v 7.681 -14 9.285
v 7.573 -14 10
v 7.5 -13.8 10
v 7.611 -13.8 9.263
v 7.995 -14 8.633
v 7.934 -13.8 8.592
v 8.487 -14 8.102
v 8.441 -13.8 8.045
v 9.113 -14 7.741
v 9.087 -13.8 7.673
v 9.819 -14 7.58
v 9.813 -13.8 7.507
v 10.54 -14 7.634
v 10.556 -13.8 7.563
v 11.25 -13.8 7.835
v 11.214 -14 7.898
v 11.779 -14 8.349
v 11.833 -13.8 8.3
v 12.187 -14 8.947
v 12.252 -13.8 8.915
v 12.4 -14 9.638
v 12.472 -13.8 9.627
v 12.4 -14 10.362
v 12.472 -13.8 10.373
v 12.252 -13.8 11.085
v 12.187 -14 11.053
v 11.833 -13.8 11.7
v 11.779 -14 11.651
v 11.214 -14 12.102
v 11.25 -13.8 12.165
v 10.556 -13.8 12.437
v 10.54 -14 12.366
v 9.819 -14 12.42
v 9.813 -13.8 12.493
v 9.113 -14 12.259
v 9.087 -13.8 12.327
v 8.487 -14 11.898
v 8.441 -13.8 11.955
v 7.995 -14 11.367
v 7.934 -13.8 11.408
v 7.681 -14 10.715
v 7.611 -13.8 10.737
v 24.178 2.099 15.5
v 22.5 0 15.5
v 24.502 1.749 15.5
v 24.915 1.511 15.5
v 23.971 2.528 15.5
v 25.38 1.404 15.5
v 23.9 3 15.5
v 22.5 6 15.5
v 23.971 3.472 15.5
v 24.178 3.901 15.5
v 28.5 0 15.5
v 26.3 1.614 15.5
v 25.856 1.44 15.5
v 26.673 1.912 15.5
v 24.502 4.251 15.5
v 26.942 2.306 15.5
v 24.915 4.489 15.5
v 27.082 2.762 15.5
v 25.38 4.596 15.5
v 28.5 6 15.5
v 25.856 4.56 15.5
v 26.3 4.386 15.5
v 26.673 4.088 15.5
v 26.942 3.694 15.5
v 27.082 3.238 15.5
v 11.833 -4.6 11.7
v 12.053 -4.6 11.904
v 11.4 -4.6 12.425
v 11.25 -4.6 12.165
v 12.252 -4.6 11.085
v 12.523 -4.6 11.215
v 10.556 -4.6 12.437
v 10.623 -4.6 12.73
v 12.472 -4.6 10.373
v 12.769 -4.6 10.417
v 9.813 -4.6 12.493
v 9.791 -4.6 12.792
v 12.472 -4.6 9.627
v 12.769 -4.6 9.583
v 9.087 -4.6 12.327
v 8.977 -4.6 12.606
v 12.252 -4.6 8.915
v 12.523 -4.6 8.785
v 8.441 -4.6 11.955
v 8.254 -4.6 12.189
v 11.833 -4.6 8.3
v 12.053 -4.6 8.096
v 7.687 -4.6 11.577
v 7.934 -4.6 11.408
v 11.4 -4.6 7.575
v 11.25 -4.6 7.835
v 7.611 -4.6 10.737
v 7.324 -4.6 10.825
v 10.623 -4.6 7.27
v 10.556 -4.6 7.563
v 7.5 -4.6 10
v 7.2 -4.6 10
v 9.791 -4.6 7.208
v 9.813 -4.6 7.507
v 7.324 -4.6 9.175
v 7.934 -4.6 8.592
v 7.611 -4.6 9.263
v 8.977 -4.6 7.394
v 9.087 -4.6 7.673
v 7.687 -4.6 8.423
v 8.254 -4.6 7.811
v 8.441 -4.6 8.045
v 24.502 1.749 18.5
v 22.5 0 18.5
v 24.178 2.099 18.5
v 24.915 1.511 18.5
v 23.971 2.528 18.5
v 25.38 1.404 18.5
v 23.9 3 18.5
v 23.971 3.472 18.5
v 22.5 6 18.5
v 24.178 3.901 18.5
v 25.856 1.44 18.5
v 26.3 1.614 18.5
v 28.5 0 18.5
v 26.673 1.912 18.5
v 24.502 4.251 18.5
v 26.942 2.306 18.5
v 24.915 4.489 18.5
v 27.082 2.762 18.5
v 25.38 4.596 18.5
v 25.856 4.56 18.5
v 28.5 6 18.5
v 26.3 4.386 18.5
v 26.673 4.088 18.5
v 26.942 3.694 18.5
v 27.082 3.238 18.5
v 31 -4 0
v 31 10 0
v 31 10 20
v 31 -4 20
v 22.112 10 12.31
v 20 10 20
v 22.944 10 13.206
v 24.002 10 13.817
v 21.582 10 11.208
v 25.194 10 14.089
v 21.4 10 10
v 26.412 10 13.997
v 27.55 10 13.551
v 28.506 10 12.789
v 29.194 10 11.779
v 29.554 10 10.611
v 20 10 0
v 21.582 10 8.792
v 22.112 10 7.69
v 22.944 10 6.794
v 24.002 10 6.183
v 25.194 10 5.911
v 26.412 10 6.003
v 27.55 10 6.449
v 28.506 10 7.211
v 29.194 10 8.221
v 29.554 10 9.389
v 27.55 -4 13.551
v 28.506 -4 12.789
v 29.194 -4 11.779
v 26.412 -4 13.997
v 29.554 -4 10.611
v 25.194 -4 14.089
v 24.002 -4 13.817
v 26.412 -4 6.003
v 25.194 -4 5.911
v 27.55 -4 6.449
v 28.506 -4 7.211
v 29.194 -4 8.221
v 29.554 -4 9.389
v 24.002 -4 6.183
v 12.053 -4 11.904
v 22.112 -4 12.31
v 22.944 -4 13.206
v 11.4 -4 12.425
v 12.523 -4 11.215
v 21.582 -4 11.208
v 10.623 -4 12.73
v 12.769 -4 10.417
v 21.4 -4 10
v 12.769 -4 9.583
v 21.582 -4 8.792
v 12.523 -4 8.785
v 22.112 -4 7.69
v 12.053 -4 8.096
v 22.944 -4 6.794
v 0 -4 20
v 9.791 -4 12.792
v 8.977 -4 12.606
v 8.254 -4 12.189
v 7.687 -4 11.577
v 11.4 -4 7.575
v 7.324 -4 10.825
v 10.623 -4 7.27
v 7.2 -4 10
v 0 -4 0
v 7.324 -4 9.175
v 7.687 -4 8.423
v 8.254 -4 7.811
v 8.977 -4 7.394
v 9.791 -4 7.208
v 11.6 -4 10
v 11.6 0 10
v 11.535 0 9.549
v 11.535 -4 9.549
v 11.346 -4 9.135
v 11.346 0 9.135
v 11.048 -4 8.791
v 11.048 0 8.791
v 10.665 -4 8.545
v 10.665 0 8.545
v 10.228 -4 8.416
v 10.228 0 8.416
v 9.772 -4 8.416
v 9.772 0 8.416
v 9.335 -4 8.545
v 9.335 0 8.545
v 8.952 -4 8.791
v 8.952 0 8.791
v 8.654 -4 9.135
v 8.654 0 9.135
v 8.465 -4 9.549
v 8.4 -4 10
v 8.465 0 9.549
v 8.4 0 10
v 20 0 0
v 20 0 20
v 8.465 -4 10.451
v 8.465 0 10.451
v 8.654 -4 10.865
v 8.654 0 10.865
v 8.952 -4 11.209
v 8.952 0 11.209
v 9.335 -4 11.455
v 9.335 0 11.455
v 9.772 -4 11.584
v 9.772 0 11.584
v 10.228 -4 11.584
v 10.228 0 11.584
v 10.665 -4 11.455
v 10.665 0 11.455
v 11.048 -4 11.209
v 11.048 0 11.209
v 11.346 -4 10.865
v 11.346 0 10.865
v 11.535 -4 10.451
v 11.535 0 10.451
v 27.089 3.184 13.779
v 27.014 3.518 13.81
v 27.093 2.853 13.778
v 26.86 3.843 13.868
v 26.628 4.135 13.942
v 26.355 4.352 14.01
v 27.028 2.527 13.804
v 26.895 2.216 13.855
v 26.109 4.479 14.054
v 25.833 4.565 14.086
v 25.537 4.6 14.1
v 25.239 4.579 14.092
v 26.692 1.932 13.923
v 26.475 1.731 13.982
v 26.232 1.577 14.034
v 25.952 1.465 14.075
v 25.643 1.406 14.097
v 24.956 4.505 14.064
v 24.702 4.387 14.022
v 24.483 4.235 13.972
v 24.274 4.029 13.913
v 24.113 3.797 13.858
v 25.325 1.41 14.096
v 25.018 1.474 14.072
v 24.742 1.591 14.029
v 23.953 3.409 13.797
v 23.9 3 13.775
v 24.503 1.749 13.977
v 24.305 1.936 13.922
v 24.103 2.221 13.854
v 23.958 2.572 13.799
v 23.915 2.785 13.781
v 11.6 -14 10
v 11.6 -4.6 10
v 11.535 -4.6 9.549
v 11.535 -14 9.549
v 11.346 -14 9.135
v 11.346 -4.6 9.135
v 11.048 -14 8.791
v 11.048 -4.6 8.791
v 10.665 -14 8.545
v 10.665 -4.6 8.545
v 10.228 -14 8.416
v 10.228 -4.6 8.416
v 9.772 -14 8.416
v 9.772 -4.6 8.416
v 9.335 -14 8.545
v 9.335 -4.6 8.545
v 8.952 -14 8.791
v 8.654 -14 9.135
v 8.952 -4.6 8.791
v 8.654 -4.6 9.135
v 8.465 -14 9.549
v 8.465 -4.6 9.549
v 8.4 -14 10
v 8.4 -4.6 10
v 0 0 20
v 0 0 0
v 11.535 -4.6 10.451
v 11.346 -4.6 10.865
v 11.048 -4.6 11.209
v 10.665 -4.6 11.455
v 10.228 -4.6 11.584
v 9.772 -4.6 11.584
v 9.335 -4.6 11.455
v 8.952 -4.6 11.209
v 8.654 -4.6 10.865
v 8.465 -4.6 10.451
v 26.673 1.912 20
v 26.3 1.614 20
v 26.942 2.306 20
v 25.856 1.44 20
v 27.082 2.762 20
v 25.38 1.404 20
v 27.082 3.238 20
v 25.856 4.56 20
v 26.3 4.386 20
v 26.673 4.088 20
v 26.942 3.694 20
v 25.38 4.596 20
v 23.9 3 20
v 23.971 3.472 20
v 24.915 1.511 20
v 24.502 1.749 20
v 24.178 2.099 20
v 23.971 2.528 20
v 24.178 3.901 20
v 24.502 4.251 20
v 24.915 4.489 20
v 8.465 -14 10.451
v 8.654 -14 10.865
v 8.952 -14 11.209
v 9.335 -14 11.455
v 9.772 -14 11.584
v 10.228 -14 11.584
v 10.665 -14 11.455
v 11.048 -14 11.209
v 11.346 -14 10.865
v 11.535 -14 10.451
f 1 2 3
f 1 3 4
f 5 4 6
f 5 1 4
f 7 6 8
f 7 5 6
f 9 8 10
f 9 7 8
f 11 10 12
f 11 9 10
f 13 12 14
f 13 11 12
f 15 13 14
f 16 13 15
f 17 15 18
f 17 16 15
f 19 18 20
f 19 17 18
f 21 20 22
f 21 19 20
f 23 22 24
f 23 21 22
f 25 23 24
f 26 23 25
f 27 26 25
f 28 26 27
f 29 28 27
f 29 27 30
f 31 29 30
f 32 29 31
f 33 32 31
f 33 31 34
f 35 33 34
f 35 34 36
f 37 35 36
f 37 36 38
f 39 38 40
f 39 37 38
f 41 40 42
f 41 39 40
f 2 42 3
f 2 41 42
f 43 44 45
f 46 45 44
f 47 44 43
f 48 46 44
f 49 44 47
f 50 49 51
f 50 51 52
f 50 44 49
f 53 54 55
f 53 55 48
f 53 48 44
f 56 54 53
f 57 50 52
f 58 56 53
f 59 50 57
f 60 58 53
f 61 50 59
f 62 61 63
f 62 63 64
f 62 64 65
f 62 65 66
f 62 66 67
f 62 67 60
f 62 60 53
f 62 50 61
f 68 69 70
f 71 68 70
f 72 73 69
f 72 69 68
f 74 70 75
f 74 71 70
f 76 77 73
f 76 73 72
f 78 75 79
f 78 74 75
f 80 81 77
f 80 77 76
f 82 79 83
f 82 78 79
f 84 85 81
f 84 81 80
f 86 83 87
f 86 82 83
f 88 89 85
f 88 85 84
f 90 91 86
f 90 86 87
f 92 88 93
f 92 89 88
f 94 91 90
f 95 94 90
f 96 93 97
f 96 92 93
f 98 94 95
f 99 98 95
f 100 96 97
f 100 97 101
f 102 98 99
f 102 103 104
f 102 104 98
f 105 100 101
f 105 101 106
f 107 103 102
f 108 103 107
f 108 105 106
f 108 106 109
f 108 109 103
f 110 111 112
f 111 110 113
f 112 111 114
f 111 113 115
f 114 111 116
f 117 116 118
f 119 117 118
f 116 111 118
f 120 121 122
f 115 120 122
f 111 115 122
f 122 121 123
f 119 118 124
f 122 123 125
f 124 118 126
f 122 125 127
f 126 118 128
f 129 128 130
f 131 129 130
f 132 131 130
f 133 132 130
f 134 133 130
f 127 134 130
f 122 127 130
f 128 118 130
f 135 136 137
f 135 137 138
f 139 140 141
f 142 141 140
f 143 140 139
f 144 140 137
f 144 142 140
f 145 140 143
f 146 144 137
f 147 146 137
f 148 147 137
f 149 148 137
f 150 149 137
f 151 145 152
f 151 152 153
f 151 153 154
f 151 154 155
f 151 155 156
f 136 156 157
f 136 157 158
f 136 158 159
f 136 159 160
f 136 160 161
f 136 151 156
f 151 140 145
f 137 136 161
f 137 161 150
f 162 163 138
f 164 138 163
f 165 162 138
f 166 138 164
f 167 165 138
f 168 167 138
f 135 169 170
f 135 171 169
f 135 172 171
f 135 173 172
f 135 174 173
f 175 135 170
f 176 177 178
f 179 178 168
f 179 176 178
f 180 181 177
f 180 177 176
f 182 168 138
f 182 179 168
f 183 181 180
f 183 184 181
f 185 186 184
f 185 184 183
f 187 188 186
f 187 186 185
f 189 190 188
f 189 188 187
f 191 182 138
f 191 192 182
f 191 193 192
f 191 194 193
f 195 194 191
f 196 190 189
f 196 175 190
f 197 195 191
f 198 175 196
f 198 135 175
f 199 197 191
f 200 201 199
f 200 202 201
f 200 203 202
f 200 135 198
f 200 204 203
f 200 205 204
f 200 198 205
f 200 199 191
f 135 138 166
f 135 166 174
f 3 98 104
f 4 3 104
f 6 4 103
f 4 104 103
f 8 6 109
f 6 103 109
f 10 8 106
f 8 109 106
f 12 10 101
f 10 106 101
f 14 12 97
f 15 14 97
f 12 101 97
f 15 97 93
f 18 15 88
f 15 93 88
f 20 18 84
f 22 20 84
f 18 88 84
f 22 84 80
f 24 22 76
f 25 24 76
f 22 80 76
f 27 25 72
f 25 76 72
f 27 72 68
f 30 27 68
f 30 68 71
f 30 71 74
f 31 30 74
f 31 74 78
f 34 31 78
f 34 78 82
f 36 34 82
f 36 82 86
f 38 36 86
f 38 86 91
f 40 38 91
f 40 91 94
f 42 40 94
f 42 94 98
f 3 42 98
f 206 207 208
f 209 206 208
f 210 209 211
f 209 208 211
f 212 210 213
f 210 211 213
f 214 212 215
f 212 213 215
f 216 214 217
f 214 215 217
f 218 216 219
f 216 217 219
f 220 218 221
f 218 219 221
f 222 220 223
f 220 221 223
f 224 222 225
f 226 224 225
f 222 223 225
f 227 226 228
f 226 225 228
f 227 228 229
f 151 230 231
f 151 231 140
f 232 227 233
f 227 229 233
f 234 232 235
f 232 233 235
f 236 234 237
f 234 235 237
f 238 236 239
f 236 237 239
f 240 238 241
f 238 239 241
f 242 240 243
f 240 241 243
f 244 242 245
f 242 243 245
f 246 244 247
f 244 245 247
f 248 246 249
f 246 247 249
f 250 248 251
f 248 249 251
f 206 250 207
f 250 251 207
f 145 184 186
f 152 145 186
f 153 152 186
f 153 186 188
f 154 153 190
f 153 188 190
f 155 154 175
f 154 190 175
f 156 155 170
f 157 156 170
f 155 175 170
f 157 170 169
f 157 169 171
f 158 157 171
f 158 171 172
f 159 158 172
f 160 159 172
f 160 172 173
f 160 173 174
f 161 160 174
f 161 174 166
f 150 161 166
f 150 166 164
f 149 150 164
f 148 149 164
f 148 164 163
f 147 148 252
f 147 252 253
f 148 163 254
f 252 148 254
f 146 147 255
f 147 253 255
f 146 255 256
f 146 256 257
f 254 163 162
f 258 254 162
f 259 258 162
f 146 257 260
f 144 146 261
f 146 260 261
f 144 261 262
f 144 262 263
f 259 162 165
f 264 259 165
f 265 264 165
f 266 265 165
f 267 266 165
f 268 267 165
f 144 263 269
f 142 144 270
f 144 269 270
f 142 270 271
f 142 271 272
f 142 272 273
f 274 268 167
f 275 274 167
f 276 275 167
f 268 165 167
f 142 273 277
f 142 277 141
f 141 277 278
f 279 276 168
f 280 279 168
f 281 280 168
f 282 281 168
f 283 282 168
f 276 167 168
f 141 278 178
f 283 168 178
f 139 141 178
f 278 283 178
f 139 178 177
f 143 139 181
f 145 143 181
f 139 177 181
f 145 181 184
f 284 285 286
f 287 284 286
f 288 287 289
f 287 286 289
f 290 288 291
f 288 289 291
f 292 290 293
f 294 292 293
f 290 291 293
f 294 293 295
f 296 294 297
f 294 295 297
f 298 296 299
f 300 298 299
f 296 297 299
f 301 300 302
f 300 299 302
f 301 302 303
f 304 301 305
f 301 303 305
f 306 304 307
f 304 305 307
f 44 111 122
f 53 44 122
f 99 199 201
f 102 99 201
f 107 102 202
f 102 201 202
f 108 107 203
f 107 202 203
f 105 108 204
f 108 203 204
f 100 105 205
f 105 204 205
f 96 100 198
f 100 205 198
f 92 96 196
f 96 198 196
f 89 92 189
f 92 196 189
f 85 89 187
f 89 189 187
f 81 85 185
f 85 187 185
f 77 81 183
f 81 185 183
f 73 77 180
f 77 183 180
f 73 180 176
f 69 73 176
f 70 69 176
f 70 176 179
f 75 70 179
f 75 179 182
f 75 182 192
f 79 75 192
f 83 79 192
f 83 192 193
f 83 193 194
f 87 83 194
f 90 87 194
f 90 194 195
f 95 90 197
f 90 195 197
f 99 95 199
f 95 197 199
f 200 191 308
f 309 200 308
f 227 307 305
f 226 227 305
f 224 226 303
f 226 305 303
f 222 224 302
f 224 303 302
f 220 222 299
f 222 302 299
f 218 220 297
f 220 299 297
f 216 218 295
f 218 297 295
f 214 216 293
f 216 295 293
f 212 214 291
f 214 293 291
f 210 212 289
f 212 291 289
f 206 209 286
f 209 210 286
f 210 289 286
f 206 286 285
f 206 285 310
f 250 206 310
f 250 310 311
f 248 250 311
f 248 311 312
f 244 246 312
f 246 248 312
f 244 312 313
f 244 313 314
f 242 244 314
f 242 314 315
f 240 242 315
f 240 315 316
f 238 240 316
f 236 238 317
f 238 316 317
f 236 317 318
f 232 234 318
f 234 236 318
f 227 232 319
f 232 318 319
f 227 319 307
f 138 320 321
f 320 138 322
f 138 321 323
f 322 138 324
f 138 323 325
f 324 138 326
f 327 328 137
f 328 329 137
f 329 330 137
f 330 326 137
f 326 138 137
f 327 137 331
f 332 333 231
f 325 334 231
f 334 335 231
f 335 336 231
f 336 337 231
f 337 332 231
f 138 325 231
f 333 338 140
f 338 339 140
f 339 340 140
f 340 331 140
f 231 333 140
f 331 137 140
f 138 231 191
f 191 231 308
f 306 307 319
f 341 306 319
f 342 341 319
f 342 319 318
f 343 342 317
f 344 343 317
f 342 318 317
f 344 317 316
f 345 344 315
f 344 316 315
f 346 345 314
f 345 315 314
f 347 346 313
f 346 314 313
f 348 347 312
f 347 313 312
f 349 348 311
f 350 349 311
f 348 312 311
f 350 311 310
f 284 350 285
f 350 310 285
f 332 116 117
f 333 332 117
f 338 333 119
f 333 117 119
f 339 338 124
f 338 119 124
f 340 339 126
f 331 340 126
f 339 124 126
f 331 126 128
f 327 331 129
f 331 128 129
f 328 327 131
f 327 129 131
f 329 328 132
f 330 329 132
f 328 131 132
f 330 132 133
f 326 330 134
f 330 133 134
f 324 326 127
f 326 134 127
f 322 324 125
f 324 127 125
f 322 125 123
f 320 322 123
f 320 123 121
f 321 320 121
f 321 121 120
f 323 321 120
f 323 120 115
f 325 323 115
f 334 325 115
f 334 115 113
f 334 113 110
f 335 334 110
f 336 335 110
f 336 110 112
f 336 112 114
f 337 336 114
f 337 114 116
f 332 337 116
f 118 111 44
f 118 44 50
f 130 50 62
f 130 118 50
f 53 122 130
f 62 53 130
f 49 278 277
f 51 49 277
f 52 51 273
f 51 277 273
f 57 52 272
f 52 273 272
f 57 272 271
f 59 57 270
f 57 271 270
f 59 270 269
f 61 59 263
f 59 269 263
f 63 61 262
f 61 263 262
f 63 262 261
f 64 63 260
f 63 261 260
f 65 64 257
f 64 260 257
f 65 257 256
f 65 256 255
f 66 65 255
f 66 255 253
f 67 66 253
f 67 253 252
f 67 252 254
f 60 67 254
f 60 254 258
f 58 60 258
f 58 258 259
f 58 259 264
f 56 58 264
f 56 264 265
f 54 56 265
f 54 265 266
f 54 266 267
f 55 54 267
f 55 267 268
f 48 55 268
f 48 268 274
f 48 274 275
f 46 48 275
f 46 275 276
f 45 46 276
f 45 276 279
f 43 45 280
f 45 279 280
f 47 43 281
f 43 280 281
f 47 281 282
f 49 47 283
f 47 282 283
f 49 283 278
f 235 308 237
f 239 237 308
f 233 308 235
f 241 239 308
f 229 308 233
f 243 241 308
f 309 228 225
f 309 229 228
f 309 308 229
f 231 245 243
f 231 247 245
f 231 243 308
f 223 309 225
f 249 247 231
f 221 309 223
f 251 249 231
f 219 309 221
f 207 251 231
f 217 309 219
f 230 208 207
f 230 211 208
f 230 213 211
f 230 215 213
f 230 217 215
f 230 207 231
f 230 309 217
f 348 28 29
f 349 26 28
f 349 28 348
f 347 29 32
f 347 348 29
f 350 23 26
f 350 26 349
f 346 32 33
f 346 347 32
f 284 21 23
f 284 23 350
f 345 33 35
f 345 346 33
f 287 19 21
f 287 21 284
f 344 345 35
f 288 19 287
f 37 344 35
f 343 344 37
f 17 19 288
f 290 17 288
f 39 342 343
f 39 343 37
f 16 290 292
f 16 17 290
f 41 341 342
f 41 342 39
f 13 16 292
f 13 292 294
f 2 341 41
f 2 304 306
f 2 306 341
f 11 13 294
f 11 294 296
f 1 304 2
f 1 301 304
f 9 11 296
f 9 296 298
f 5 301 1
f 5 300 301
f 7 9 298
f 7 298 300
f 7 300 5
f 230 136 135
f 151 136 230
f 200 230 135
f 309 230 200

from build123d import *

# Parameters (mm, degrees)
EXTRUDE_1_DEPTH     = 20
HOLE_WIZARD_2_D     = 8.2
SKETCH_7_W          = 6
SKETCH_7_H          = 6
CUT_EXTRUDE_1_DEPTH = 1.5
HOLE_WIZARD_3_D     = 3.2
HOLE_WIZARD_3_DEPTH = 7
SKETCH_11_R         = 2.5
EXTRUDE_2_DEPTH     = 10
HOLE_WIZARD_4_D     = 3.2
SKETCH_14_R         = 2.8
EXTRUDE_3_DEPTH     = 0.6
CHAMFER_1_SIZE      = 0.2
CHAMFER_1_SIZE2     = 0.072794047
HOLE_WIZARD_5_D     = 3.2


with BuildPart() as part:
    # 草图1 → 凸台-拉伸1 (new body)
    with BuildSketch(Plane.XY):
        Polygon((0, 0), (20, 0), (20, 10), (31, 10), (31, -4), (0, -4), align=None)
    extrude(amount=EXTRUDE_1_DEPTH)

    # 孔2 (through all)
    with Locations(Plane(origin=(0, 10, 0), x_dir=(1, 0, 0), z_dir=(0, 1, 0))):
        with Locations((25.5, -10)):
            Hole(HOLE_WIZARD_2_D / 2)

    # 草图7 → 切除-拉伸1 (cut, symmetric)
    with BuildSketch(Plane.XY.offset(17)):
        with Locations((25.5, 3)):
            Rectangle(SKETCH_7_W, SKETCH_7_H)
    extrude(amount=CUT_EXTRUDE_1_DEPTH, both=True, mode=Mode.SUBTRACT)

    # 孔3
    with Locations(Plane.XY.offset(20)):
        with Locations((25.5, 3)):
            Hole(HOLE_WIZARD_3_D / 2, depth=HOLE_WIZARD_3_DEPTH)

    # 草图11 → 凸台-拉伸2 (add)
    with BuildSketch(Plane.XZ.offset(4)):
        with Locations(Location((10, 10, 0), (0, 0, 180))):
            Circle(SKETCH_11_R)
    extrude(amount=EXTRUDE_2_DEPTH)

    # 孔4 (through all)
    with Locations(Plane(origin=(0, -14, 0), x_dir=(-1, 0, 0), z_dir=(0, -1, 0))):
        with Locations((-10, -10)):
            Hole(HOLE_WIZARD_4_D / 2)

    # 草图14 → 凸台-拉伸3 (add)
    with BuildSketch(Plane.XZ.offset(4)):
        with Locations(Location((10, 10, 0), (0, 0, 180))):
            Circle(SKETCH_14_R)
    extrude(amount=EXTRUDE_3_DEPTH)

    # 倒角1
    chamfer_1_edges = [part.edges().sort_by_distance(p)[0] for p in [
        (12.5, -14, 10),
    ]]
    chamfer_1_side = [part.faces().sort_by_distance(p)[0] for p in [
        (12.5, -9.3, 10),
    ]]
    chamfer(chamfer_1_edges, length=CHAMFER_1_SIZE, length2=CHAMFER_1_SIZE2, reference=chamfer_1_side[0])

    # 孔5 (through all)
    with Locations(Plane(origin=(0, 0, 0), x_dir=(1, 0, 0), z_dir=(0, 1, 0))):
        with Locations((10, -10)):
            Hole(HOLE_WIZARD_5_D / 2)


solid = part.part
